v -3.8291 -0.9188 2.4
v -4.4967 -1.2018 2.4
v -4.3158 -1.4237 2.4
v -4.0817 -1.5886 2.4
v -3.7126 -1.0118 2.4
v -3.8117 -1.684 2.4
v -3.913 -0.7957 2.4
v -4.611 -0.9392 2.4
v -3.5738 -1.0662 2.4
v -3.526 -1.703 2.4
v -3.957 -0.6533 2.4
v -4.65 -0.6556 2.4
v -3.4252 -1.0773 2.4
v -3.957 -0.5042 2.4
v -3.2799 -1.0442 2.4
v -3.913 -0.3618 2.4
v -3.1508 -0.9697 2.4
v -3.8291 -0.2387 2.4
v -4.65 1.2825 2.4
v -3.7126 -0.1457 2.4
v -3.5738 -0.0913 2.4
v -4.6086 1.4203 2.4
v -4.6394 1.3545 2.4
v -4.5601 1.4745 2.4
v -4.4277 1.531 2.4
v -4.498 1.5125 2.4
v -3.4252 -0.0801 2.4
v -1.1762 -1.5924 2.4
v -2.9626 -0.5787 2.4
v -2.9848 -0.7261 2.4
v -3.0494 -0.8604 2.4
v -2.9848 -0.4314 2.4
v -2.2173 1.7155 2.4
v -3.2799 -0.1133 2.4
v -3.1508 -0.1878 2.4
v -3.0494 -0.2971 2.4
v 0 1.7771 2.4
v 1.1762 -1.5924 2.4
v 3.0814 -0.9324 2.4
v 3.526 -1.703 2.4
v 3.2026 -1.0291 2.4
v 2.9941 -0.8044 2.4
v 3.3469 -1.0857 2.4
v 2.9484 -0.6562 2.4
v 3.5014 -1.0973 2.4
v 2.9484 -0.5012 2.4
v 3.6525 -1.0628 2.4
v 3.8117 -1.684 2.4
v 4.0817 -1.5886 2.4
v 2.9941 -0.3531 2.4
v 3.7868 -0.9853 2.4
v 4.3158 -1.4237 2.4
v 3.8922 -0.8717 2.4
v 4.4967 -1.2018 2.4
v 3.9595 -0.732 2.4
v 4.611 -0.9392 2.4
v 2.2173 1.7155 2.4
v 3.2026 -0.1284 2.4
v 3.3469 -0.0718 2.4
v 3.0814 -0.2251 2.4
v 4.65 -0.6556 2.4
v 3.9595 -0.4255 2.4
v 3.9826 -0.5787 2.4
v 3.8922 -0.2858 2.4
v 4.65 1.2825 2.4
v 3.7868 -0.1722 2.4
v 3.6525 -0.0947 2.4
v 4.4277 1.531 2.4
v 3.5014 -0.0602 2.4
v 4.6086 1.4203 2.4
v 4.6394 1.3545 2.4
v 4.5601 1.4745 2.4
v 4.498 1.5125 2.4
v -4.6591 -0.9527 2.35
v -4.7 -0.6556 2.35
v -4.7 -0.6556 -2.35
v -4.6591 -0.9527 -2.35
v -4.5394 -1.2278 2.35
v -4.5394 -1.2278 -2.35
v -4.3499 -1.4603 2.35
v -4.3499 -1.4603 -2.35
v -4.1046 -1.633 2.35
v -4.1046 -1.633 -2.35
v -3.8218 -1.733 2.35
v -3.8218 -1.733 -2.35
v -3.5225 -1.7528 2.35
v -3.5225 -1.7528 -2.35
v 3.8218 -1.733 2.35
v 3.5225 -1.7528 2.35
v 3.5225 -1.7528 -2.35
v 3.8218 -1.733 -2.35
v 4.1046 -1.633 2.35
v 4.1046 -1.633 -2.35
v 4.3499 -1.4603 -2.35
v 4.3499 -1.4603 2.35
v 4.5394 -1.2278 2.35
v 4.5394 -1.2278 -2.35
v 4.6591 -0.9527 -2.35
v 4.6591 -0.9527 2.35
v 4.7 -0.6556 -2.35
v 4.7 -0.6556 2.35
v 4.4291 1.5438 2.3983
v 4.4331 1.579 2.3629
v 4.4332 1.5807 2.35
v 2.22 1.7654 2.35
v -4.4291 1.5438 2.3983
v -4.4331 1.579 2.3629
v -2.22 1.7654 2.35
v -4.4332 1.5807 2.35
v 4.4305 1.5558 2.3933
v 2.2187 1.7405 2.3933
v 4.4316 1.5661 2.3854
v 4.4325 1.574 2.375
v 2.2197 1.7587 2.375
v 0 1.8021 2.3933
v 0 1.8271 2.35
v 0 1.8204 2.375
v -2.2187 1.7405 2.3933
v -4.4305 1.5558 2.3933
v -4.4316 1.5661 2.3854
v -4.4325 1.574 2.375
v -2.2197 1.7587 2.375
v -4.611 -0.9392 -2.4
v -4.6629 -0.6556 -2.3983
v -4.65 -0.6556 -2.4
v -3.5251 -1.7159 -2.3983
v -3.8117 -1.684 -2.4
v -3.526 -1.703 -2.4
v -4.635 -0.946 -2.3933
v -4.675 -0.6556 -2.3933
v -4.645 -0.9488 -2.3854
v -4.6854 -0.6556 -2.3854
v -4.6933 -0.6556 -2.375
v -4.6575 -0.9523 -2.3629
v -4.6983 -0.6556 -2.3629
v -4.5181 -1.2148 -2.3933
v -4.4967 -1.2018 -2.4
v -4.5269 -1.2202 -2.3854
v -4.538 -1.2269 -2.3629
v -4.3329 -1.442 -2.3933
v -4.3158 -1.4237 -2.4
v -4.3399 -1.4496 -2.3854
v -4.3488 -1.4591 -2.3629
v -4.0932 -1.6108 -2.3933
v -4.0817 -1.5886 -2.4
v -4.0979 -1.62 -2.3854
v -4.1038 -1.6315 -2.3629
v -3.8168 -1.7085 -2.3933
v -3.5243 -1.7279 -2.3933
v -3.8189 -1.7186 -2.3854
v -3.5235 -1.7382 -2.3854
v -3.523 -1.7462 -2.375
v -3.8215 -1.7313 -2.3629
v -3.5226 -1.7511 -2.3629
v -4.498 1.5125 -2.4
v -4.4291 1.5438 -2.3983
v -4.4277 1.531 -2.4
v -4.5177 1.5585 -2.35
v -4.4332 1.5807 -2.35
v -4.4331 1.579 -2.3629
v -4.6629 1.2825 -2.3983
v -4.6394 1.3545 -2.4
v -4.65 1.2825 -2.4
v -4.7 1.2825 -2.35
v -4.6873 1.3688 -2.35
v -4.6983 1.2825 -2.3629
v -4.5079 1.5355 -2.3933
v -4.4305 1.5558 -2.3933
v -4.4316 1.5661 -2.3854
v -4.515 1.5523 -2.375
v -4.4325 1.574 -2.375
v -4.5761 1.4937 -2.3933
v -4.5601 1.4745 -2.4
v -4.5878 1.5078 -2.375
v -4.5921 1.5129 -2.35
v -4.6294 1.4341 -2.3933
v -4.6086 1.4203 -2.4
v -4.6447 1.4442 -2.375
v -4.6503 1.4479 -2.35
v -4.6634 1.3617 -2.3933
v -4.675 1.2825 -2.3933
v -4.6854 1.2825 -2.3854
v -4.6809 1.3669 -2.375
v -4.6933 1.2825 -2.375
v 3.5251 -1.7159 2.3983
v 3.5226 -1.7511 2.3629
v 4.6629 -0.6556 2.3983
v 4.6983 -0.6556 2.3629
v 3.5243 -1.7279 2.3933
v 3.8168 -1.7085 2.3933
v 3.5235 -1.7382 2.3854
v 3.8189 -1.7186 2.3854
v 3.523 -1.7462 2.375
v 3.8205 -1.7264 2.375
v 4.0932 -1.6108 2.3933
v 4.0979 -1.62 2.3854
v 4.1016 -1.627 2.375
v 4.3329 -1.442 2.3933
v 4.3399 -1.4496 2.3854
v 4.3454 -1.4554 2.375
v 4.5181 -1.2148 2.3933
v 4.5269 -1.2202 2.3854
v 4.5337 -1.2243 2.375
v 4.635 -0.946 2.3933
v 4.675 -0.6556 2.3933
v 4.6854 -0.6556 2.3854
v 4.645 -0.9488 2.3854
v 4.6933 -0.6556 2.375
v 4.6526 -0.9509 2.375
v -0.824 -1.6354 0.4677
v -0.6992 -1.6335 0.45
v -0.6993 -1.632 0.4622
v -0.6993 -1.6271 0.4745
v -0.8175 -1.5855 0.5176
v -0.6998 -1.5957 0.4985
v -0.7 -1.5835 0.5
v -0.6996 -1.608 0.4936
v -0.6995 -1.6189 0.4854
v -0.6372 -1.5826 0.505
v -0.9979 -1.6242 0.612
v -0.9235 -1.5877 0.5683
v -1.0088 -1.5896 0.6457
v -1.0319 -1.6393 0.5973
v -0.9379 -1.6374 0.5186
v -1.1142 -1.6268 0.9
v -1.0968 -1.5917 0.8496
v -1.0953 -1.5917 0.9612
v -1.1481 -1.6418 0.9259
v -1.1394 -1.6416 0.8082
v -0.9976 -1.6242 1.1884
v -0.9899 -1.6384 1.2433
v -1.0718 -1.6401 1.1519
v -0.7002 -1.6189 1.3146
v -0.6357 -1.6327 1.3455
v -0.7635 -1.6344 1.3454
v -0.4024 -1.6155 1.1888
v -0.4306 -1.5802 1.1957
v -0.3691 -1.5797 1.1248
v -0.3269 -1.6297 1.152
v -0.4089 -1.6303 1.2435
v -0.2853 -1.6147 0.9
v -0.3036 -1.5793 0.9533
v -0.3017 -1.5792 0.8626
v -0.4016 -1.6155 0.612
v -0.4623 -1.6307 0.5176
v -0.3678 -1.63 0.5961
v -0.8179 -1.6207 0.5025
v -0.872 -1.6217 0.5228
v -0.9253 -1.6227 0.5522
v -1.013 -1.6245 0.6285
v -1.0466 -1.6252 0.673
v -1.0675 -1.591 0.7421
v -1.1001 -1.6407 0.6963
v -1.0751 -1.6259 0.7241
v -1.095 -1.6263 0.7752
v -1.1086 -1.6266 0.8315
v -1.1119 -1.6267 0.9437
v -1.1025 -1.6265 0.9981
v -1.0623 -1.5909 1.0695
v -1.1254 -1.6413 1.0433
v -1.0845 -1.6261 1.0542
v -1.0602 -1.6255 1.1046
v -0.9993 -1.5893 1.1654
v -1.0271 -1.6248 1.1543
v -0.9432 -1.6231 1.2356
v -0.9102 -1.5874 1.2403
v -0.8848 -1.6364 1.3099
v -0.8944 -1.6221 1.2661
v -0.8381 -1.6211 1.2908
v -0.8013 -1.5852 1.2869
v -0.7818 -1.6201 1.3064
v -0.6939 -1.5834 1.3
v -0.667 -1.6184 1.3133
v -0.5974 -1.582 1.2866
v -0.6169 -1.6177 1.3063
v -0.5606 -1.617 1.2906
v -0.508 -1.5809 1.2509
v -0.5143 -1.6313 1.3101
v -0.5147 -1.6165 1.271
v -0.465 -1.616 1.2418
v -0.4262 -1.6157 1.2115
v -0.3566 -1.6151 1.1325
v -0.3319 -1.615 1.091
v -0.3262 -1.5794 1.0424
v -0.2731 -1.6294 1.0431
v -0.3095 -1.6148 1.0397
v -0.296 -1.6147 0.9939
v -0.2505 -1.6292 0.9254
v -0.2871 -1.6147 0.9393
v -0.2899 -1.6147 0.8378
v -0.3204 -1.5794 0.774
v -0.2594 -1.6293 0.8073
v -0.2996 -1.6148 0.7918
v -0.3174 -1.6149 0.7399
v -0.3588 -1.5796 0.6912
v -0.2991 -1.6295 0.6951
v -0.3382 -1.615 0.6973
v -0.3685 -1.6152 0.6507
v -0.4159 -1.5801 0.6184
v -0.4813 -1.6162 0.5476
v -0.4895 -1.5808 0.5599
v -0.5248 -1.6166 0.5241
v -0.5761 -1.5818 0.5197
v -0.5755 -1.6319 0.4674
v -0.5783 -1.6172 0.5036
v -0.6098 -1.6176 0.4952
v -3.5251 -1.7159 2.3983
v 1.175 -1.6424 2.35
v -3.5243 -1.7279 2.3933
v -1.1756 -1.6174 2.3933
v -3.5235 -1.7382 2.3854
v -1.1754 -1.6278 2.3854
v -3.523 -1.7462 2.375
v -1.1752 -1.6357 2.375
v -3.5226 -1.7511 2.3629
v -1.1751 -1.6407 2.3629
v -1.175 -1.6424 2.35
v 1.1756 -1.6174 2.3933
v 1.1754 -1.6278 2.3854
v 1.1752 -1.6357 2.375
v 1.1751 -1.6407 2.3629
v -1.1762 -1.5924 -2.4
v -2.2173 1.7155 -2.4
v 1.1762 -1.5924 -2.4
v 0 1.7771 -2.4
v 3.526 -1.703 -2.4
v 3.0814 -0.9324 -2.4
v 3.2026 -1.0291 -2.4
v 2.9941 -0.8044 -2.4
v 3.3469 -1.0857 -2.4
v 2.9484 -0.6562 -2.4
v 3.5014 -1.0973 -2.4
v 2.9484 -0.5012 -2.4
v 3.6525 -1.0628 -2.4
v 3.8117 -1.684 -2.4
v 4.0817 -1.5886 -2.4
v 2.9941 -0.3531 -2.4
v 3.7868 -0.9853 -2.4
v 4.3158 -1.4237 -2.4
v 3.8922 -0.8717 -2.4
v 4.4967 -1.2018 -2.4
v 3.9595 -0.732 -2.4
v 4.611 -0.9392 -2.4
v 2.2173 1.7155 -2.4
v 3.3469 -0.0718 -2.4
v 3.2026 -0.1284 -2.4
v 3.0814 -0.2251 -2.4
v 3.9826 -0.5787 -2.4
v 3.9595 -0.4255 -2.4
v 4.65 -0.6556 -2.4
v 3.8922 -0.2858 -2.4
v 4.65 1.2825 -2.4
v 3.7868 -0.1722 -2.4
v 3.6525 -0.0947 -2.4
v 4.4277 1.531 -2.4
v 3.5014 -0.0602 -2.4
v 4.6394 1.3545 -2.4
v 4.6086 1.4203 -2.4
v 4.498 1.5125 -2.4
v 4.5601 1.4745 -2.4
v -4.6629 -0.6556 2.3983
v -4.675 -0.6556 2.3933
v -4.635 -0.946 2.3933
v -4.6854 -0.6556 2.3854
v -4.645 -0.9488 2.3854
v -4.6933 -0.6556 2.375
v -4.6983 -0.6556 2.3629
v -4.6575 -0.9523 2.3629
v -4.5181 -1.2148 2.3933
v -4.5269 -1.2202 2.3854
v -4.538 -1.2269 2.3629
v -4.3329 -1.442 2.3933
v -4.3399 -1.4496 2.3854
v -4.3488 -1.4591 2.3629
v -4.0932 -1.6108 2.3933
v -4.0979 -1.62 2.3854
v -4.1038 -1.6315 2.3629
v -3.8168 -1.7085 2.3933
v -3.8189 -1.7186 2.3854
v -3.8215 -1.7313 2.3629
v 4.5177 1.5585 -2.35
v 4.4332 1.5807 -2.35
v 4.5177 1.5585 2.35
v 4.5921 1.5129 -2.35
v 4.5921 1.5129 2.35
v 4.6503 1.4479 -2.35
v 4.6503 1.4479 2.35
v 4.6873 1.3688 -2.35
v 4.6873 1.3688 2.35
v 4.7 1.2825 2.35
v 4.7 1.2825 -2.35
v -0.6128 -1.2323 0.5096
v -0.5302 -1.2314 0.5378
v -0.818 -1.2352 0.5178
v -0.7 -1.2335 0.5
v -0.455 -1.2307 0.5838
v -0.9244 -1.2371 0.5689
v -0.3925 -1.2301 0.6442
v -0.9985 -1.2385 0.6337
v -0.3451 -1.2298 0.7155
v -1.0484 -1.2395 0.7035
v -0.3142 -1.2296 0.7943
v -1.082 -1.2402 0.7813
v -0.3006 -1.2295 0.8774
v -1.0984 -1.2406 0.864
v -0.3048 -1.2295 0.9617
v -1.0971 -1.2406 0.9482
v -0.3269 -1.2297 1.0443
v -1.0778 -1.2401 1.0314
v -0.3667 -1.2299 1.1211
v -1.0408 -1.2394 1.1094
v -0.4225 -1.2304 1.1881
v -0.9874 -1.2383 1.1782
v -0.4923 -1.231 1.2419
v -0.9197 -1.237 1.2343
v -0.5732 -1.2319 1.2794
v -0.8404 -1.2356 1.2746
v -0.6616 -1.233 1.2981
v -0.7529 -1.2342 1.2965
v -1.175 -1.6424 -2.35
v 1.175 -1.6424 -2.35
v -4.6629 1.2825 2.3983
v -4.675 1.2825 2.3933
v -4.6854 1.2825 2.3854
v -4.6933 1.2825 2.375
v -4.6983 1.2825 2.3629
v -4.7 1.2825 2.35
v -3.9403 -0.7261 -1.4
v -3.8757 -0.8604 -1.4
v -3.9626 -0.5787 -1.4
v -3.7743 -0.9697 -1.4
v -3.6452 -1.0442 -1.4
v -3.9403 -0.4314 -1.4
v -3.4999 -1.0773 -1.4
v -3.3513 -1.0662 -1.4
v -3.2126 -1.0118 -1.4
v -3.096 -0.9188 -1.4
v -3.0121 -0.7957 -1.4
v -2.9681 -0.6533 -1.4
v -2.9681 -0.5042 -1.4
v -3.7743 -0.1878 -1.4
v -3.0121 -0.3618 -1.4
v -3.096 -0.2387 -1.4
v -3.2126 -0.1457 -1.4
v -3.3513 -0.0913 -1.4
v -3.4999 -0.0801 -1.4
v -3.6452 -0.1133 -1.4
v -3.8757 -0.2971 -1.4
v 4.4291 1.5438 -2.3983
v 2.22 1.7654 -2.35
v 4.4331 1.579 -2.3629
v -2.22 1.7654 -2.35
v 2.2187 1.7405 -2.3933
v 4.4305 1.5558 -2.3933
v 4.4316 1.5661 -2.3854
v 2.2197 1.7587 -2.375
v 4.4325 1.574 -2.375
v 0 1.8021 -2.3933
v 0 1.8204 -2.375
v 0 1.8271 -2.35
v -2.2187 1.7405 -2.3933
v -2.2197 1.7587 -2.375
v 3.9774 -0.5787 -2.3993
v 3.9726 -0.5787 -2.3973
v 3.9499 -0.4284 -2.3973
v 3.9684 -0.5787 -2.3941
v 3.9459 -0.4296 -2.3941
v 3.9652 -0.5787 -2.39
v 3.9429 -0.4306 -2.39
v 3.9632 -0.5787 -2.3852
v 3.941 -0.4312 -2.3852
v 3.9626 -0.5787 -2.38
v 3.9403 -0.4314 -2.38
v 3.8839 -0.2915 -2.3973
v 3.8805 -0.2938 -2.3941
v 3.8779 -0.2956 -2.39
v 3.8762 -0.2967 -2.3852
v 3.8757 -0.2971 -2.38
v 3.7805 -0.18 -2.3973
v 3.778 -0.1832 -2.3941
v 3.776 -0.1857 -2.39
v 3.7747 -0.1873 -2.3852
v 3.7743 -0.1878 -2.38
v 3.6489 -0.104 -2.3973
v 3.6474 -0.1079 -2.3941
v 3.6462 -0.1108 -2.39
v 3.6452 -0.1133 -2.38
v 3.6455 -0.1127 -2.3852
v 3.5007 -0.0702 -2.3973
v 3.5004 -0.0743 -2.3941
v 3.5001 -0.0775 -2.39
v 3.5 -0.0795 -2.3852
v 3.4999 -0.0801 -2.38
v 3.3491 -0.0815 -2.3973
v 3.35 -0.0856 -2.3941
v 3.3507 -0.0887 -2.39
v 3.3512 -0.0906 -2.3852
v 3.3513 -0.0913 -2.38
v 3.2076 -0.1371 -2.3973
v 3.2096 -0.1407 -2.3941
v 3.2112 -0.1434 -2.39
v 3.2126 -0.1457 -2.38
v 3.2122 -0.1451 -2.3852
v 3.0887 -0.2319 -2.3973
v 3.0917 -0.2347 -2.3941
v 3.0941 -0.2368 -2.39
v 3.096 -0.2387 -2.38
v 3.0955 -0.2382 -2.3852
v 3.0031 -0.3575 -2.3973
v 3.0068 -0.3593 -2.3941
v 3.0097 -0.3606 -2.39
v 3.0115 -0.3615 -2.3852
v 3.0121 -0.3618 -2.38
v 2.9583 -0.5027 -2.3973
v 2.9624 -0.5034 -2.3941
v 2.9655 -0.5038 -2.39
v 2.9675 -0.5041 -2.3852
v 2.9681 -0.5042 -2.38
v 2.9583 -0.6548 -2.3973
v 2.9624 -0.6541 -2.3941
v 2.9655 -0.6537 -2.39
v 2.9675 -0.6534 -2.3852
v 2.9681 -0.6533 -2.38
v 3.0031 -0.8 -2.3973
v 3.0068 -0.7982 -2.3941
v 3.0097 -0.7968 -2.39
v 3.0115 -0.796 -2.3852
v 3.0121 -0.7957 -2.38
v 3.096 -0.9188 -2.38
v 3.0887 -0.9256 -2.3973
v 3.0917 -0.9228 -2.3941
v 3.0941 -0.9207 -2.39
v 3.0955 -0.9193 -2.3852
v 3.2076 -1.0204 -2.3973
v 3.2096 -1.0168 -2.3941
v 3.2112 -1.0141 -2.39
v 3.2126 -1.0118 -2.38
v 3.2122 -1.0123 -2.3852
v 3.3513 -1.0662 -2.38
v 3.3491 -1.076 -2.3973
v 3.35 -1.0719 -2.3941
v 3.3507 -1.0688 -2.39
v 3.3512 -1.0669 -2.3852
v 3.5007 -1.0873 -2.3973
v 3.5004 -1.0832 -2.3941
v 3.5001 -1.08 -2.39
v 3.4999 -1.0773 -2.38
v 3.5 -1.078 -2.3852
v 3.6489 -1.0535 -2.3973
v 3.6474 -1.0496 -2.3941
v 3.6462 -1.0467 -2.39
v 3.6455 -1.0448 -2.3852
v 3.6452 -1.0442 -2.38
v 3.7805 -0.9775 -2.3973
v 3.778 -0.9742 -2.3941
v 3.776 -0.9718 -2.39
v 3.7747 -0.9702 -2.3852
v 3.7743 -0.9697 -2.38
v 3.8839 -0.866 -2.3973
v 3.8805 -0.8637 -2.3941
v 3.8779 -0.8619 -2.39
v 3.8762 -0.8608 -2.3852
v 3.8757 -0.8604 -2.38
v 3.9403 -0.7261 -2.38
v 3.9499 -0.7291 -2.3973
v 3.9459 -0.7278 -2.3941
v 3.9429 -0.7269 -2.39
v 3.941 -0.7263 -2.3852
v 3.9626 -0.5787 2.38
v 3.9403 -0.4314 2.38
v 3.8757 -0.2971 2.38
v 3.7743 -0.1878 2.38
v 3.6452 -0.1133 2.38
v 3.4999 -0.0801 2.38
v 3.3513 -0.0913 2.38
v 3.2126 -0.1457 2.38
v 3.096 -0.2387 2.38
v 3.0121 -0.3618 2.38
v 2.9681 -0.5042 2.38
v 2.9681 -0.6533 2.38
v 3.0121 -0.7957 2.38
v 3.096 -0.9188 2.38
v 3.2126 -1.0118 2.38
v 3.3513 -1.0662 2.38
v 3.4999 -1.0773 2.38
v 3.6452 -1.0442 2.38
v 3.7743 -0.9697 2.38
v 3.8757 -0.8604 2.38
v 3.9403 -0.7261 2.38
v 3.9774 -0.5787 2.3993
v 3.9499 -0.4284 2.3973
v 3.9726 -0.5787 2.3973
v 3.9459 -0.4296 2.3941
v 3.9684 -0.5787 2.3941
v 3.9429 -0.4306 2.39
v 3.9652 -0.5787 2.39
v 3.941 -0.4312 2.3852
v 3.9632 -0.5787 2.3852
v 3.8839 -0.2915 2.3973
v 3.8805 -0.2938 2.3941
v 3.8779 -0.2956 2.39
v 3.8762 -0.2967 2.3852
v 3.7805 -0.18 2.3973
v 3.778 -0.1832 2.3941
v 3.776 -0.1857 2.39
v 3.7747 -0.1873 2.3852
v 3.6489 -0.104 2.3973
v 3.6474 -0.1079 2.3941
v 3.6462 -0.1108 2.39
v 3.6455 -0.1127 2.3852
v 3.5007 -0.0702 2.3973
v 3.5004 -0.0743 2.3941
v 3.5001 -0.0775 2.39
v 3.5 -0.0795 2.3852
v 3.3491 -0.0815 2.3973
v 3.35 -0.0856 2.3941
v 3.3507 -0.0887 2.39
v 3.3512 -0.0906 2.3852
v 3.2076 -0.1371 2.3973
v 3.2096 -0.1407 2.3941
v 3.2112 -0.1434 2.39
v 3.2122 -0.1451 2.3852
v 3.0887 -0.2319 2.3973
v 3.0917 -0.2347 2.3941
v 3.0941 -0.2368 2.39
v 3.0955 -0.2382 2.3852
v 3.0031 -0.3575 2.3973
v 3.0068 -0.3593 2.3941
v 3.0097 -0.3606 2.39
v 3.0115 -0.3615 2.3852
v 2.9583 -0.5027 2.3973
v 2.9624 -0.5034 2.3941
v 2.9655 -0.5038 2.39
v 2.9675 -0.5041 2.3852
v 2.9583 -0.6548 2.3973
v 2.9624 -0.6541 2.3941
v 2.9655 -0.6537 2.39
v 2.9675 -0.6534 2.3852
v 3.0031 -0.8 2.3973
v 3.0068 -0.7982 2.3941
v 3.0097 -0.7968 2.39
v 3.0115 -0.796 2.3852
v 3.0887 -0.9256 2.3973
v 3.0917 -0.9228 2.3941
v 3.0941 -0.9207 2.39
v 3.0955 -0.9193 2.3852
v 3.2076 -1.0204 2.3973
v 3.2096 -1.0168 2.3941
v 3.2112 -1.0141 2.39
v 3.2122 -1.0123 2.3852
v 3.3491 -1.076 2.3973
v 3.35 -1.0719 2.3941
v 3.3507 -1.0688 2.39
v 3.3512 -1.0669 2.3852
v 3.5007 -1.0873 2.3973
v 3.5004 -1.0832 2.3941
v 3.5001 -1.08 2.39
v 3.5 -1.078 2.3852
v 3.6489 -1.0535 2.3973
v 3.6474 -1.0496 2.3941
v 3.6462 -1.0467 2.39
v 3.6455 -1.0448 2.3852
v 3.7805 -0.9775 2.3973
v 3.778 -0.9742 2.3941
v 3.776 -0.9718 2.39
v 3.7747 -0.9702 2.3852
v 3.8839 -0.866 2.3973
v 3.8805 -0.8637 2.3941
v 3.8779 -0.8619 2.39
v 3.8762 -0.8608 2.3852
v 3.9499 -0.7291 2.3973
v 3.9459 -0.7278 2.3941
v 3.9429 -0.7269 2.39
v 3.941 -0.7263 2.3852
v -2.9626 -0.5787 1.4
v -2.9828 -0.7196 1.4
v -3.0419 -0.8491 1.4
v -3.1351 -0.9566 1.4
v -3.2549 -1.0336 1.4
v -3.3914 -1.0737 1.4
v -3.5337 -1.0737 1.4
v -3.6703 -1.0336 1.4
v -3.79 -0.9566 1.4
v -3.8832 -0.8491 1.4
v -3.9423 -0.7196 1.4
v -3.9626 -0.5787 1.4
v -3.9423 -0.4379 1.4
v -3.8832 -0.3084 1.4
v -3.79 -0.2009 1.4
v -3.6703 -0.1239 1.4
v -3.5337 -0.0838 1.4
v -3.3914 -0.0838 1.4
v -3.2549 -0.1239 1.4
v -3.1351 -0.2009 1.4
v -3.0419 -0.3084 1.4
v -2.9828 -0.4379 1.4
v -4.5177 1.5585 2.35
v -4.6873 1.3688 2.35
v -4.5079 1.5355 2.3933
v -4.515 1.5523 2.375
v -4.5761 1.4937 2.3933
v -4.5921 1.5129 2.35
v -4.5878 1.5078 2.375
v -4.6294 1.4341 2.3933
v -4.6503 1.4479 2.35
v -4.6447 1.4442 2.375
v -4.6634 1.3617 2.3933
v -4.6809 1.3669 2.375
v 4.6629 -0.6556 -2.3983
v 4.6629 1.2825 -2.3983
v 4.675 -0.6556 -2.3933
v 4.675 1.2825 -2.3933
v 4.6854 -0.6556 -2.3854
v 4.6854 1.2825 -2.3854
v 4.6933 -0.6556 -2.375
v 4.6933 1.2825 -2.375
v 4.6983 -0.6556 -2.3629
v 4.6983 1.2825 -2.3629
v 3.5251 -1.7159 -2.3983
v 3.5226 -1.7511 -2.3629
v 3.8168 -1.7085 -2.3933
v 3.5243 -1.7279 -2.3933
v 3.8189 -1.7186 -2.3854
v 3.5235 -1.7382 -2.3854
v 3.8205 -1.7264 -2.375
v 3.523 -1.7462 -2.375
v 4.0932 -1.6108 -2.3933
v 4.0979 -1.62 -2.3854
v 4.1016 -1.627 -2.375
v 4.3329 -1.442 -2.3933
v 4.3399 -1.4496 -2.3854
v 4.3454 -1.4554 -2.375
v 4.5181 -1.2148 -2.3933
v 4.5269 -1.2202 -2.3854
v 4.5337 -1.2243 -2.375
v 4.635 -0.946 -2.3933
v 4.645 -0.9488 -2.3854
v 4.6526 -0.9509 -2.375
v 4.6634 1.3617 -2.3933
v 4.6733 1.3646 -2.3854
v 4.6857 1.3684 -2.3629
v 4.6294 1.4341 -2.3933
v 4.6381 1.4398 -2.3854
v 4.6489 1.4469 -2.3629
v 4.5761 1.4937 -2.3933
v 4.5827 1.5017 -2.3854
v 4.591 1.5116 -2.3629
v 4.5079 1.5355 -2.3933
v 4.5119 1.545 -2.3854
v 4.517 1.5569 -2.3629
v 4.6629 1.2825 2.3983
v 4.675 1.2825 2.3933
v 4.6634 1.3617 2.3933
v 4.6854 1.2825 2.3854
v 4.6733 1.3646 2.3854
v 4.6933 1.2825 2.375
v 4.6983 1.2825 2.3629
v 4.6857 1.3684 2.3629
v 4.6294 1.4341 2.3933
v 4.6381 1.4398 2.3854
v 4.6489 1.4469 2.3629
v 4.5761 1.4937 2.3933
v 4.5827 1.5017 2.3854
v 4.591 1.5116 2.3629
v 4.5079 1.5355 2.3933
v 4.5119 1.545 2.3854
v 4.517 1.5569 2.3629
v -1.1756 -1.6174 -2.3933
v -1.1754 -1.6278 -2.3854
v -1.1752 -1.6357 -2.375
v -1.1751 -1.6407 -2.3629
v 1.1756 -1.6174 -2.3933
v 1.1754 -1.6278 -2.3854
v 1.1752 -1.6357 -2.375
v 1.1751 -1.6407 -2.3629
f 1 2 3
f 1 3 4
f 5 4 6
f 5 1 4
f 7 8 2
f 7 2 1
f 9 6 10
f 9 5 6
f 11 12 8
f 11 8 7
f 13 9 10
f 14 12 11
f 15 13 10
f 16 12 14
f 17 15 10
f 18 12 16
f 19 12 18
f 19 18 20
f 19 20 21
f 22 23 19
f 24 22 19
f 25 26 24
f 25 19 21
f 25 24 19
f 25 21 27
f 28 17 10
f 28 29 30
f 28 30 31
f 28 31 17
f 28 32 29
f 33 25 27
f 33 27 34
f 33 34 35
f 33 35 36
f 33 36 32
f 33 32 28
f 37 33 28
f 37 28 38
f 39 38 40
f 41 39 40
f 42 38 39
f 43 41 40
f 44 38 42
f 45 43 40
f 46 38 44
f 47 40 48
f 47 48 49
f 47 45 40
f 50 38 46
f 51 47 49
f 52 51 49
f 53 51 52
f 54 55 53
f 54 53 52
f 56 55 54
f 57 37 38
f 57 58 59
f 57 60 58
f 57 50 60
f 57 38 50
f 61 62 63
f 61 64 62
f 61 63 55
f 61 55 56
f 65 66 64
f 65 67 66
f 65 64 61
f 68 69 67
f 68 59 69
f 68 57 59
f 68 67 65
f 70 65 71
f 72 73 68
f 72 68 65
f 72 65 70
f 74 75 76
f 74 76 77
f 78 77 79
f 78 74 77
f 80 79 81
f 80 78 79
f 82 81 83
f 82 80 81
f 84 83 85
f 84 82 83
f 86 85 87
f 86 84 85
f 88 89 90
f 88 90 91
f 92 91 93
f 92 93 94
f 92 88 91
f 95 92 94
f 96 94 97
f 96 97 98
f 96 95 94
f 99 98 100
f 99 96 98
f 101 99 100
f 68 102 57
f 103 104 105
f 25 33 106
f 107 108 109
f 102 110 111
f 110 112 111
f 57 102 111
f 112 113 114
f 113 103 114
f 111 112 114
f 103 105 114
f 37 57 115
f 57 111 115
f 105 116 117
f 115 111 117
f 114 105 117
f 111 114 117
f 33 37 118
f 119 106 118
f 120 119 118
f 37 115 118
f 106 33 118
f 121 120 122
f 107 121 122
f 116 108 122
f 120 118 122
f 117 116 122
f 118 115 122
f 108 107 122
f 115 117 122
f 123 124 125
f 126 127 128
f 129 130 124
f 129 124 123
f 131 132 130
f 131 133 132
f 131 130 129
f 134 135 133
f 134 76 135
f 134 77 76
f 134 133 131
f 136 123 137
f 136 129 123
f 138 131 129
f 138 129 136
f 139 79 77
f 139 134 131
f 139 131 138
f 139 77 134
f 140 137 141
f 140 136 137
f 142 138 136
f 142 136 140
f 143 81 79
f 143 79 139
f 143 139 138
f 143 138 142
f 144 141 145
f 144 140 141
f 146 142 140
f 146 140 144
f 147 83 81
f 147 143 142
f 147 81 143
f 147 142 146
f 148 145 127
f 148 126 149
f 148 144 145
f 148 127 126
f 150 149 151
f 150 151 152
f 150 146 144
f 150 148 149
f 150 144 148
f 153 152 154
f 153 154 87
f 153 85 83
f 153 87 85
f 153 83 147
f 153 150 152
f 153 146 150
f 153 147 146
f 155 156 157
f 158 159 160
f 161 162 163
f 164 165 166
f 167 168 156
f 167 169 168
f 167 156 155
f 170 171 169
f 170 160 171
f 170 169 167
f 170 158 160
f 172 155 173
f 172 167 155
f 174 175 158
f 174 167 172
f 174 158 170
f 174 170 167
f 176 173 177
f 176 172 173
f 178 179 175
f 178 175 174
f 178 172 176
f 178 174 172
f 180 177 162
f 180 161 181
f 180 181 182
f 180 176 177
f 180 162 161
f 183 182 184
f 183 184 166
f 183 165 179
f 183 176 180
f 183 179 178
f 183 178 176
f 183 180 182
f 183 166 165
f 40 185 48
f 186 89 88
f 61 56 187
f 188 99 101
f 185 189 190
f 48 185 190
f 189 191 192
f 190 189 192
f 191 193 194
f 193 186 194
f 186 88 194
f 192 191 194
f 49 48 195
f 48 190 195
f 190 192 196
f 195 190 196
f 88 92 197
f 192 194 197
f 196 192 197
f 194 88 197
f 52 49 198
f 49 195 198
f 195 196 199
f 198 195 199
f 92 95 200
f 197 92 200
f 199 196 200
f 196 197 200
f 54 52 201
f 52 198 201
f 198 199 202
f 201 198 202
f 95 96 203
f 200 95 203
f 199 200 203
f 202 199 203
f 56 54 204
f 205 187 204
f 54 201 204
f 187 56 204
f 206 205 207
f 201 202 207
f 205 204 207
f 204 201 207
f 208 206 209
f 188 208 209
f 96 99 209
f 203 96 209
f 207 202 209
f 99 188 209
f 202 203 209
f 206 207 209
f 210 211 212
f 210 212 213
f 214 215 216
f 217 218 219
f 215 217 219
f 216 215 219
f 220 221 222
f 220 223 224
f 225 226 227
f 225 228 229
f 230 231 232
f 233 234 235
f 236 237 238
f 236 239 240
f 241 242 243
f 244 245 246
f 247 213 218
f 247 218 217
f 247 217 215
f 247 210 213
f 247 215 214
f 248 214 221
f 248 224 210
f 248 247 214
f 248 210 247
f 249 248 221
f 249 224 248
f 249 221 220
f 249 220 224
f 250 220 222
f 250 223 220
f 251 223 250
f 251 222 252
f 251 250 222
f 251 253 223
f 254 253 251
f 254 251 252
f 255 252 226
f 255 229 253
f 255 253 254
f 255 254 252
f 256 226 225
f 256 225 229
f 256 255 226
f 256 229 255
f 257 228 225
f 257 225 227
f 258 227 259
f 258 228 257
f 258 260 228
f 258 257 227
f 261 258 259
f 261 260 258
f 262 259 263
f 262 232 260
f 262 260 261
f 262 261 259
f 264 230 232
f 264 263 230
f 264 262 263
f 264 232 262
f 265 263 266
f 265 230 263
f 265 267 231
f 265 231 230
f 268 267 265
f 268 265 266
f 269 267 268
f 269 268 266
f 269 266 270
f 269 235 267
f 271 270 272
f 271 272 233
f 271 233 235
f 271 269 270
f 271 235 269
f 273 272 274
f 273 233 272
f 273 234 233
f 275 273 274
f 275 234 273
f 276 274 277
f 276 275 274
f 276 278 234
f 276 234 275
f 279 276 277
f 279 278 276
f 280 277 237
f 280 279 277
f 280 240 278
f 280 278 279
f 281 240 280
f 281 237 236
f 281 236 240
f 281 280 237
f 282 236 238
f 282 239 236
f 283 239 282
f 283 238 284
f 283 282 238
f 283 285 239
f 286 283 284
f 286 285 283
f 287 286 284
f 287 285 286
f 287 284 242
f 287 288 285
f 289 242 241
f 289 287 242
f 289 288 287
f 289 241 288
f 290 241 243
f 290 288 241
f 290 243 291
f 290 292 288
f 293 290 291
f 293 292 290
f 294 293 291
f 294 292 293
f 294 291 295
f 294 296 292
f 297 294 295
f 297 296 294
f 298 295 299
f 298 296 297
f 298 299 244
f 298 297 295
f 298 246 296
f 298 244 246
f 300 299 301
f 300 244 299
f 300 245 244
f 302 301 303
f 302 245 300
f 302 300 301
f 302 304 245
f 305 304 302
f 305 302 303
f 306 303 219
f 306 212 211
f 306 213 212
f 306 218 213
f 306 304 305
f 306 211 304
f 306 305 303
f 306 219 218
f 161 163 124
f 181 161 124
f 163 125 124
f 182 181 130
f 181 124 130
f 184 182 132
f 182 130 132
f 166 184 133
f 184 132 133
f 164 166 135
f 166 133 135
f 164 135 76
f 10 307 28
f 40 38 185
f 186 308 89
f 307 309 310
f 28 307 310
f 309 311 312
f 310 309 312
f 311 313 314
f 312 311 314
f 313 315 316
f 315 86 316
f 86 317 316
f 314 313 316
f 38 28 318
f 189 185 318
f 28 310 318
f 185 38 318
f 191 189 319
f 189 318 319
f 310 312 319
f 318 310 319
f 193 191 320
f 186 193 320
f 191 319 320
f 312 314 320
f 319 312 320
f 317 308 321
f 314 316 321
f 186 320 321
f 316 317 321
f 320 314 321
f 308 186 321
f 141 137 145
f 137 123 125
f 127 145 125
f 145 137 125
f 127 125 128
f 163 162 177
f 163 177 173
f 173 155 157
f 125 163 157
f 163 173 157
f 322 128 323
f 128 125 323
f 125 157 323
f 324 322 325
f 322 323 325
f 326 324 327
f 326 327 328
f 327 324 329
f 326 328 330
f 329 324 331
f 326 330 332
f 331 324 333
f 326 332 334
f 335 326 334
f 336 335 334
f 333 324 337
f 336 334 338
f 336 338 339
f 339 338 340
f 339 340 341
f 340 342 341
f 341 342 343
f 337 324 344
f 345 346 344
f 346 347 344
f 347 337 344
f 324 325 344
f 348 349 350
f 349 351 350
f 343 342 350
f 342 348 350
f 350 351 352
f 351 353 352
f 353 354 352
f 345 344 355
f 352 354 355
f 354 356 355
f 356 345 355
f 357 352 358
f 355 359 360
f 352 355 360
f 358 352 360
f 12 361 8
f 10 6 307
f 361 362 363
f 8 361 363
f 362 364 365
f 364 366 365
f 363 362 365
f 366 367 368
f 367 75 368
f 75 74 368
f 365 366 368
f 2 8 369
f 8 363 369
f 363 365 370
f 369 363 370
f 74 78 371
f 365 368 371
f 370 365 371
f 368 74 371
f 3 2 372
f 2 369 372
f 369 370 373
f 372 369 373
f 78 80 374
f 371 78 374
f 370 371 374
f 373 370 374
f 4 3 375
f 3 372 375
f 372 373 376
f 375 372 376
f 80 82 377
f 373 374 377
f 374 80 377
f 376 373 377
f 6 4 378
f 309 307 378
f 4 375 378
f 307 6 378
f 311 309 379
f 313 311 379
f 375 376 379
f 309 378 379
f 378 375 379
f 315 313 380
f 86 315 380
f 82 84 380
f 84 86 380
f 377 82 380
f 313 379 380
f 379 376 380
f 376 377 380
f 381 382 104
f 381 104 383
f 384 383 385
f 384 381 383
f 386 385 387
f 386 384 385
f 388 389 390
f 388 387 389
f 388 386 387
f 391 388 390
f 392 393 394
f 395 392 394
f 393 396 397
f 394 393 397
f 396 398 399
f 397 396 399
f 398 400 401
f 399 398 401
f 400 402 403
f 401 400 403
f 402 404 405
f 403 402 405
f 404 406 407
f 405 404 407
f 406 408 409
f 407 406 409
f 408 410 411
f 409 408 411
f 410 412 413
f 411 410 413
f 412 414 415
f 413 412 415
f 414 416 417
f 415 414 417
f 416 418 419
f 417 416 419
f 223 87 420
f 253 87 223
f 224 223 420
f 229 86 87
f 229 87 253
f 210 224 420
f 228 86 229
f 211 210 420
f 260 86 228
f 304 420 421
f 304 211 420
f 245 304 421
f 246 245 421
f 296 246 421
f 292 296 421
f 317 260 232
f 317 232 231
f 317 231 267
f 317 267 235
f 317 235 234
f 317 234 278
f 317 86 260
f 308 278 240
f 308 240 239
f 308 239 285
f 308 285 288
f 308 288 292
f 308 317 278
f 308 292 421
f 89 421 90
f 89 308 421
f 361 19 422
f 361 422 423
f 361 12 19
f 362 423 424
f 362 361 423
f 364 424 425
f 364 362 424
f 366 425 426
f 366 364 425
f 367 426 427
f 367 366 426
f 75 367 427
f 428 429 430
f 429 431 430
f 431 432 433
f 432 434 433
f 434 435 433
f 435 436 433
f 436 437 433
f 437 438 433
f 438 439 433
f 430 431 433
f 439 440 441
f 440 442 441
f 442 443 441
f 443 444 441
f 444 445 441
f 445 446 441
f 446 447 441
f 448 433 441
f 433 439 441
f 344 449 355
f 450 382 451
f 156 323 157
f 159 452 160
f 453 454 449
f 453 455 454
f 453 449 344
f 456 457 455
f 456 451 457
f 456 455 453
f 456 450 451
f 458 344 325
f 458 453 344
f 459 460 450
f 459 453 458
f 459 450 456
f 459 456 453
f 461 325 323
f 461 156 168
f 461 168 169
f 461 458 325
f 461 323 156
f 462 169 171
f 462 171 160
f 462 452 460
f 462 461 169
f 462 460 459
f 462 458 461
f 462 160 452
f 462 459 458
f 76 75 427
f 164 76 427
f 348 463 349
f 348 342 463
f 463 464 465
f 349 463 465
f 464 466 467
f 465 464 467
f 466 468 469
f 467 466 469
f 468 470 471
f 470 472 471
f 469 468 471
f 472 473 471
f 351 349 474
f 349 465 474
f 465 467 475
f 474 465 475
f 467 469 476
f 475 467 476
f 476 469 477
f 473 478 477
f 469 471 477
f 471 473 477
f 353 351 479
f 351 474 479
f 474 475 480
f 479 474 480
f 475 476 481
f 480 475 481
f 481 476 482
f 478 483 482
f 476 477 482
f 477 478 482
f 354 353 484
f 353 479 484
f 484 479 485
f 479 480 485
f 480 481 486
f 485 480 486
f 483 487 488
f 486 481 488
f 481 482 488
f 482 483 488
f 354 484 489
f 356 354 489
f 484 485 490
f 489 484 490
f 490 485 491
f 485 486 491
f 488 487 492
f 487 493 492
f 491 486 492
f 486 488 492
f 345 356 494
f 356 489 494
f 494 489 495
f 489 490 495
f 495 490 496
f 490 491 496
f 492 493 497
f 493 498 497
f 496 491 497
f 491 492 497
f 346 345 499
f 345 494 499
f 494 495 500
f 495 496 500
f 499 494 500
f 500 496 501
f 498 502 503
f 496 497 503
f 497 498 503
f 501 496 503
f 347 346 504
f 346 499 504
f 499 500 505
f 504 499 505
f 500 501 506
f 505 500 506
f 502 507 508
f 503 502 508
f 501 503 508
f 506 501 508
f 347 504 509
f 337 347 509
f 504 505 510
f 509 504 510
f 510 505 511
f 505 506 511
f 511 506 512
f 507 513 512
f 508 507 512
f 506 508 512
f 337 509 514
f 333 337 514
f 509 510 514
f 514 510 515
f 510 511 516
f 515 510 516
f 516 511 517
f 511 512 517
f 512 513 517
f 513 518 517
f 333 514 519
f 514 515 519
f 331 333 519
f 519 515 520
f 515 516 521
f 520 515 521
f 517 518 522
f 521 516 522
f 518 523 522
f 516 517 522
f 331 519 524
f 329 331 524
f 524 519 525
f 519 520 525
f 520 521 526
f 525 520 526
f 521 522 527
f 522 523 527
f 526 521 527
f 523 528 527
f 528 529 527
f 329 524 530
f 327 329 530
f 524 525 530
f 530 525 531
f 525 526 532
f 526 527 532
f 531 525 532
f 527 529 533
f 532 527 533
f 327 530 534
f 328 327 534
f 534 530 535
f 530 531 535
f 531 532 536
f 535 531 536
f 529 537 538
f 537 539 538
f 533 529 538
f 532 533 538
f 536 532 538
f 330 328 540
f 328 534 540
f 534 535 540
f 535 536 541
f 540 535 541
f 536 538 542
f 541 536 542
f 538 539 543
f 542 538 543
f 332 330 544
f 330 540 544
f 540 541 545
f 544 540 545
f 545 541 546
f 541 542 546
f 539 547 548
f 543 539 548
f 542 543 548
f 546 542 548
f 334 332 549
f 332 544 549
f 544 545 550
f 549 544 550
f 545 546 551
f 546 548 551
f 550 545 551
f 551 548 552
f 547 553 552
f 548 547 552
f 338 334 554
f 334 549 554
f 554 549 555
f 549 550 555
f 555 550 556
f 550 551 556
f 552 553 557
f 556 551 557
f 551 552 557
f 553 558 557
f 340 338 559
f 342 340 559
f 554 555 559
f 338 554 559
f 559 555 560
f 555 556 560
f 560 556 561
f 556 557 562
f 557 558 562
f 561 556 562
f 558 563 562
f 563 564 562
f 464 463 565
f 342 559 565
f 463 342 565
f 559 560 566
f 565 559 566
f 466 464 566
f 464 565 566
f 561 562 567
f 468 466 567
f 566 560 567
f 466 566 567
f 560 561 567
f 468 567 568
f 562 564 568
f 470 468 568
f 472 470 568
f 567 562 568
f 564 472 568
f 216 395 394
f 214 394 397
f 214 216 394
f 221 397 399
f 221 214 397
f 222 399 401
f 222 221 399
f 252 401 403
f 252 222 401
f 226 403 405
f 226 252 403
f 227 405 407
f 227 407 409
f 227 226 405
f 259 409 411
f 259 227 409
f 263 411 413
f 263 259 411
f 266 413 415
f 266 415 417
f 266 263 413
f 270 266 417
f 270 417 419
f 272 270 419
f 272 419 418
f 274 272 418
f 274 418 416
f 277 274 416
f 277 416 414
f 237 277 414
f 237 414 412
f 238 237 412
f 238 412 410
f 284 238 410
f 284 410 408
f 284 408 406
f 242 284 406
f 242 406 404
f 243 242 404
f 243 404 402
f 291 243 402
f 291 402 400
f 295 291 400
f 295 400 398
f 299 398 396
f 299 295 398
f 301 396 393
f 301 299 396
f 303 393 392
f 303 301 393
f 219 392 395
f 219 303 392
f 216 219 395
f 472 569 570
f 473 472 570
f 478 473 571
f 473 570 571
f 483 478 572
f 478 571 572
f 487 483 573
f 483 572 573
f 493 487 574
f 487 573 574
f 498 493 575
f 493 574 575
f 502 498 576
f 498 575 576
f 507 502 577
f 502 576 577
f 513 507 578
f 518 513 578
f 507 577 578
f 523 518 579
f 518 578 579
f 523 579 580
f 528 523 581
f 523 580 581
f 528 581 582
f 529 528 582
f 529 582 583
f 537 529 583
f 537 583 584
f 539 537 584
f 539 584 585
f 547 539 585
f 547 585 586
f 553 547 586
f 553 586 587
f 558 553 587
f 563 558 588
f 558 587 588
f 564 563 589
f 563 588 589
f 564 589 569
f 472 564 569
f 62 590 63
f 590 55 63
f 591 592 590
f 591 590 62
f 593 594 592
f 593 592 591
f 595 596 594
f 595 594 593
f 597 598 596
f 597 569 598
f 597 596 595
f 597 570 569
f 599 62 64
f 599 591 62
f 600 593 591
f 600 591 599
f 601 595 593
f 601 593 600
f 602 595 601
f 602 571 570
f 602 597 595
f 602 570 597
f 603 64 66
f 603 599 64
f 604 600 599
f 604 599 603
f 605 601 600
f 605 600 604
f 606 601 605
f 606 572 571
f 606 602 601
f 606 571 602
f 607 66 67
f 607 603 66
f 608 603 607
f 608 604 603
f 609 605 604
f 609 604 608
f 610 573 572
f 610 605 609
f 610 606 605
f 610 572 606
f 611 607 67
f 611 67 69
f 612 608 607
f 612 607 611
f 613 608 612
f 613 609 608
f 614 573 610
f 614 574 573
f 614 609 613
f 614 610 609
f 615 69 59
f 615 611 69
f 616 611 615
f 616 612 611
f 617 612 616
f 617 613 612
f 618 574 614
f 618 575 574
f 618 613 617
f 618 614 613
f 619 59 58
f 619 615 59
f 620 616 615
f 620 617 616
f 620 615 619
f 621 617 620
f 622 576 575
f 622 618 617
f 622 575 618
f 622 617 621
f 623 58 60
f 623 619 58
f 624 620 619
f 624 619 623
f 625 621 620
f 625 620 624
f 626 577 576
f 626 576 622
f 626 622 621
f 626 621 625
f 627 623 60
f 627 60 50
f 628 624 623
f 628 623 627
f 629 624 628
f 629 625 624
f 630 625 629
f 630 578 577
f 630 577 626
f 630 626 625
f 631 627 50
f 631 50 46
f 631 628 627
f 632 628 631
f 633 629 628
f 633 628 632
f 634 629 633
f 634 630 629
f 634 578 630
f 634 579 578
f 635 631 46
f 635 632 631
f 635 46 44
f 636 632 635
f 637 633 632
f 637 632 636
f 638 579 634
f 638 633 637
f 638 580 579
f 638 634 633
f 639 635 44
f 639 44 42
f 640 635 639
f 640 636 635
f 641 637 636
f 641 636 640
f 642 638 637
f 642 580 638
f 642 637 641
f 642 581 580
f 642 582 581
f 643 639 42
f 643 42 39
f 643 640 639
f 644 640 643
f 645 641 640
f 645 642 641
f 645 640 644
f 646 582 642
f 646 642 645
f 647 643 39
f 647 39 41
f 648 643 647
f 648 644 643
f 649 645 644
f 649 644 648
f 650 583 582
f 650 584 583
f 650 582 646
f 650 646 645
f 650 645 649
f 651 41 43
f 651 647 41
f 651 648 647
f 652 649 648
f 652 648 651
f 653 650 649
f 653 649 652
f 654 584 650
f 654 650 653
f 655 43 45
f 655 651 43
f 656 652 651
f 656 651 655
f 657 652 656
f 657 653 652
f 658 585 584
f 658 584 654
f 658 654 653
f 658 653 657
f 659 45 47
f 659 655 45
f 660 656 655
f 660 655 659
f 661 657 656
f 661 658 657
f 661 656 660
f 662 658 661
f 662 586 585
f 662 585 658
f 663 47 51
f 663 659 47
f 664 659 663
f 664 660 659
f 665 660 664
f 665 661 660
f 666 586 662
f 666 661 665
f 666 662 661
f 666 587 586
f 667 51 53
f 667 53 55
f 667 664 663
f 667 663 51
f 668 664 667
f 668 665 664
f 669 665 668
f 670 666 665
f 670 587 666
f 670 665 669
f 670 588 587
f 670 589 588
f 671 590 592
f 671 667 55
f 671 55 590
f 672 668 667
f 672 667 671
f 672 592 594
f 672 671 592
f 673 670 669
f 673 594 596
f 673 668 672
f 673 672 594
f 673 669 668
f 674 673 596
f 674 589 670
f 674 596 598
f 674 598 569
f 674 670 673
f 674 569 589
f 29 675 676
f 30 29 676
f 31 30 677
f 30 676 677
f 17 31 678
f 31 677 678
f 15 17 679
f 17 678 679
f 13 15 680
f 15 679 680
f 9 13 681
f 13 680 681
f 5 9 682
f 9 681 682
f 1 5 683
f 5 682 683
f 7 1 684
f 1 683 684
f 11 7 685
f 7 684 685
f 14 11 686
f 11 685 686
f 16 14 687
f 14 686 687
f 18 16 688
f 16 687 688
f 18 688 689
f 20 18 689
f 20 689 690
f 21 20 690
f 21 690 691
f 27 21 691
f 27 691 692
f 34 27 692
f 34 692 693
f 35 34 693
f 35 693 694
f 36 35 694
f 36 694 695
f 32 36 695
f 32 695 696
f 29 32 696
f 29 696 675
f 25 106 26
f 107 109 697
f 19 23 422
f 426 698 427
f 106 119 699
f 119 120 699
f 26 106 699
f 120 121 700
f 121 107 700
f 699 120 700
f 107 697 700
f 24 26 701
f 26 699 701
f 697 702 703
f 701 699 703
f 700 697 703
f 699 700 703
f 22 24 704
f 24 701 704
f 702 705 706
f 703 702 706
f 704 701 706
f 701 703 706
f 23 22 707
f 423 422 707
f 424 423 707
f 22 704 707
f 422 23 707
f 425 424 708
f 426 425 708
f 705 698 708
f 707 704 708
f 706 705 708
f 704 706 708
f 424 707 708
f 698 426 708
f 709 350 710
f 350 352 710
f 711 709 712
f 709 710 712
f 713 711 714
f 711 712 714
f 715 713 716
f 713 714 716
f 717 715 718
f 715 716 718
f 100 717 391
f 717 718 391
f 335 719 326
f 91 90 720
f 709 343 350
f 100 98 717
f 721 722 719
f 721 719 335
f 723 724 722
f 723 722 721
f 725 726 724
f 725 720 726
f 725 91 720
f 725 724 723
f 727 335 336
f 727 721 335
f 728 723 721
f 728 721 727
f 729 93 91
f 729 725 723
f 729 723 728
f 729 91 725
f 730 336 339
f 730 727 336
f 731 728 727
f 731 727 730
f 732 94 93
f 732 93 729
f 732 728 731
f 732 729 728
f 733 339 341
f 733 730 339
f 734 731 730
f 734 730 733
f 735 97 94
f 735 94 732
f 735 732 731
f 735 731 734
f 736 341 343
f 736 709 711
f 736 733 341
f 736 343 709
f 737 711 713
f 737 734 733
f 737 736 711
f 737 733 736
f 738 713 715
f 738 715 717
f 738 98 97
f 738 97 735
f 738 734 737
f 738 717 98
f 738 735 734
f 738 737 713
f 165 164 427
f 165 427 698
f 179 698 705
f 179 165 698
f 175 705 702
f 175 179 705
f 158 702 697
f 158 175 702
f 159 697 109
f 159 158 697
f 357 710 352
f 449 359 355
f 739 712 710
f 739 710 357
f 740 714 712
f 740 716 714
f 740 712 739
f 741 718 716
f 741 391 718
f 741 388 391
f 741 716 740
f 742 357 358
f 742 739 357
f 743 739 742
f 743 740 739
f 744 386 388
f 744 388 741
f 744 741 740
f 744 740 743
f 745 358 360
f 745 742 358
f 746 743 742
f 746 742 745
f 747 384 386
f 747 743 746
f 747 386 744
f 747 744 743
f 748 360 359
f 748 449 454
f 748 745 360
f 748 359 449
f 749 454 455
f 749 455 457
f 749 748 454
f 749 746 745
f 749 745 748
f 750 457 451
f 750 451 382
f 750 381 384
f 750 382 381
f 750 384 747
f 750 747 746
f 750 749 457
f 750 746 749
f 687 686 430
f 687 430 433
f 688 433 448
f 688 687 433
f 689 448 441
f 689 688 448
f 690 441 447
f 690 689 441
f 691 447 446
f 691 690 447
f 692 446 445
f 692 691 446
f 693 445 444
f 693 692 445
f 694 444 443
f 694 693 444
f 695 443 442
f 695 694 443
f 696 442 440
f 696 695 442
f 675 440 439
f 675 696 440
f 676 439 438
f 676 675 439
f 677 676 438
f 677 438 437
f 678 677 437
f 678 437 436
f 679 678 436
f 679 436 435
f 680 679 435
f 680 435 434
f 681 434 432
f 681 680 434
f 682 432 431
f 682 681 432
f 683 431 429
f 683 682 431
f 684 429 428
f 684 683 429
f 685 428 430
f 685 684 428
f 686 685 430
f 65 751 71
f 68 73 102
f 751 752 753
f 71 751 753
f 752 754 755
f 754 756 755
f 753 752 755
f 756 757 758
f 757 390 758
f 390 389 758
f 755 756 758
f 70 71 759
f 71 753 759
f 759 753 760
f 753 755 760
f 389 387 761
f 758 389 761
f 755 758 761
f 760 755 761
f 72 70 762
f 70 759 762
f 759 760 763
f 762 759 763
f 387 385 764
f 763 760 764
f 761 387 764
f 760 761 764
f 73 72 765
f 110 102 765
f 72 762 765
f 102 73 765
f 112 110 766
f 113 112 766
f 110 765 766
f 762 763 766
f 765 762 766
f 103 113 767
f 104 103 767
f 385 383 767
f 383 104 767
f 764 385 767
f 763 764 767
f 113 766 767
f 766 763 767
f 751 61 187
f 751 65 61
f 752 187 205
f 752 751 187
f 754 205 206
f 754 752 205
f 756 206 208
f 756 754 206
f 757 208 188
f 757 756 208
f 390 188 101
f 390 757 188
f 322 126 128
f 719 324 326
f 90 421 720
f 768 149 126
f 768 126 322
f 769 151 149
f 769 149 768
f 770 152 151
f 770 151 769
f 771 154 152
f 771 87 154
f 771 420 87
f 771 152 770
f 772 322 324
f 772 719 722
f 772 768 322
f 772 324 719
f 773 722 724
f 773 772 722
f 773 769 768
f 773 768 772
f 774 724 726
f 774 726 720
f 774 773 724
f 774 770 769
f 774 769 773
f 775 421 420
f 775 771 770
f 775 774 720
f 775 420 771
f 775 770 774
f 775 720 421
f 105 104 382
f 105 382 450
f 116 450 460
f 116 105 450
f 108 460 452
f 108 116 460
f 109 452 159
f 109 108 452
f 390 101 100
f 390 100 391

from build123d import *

# Parameters (mm, degrees)
SKETCH1_W               = 9.4
SKETCH1_H               = 3.7
BOSS_EXTRUDE1_DEPTH     = 2.4
CUT_EXTRUDE1_DEPTH      = 4.8
FILLET1_R               = 1.1
FILLET2_R               = 0.3
FILLET3_R               = 0.05
SKETCH3_R               = 0.5
CUT_EXTRUDE2_DEPTH      = 4.8
FILLET4_R               = 0.02
SKETCH4_W               = 1.881576533
SKETCH4_H               = 1.177564348
BOSS_EXTRUDE2_DEPTH     = 1
SKETCH5_R               = 0.5
CUT_EXTRUDE3_DEPTH      = 10
SKETCH6_R               = 0.737542503
BOSS_EXTRUDE3_DEPTH     = 1
CUT_EXTRUDE4_REACH      = 17.585
CUT_EXTRUDE4_END_RADIUS = 50.4
CUT_EXTRUDE4_START      = -10
SKETCH7_R               = 0.4
FILLET5_R               = 0.05


with BuildPart() as part:
    # Sketch1 → Boss-Extrude1 (new, symmetric)
    with BuildSketch(Plane.XY):
        Rectangle(SKETCH1_W, SKETCH1_H)
    extrude(amount=BOSS_EXTRUDE1_DEPTH, both=True)

    # Sketch2 → Cut-Extrude1 (cut)
    with BuildSketch(Plane.XY.offset(2.4)):
        with BuildLine():
            Line((-4.7, 1.55), (-7.120690005, 4.011417256))
            Line((-7.120690005, 4.011417256), (5.535860742, 3.886722174))
            Line((5.535860742, 3.886722174), (4.7, 1.55))
            ThreePointArc((4.7, 1.55), (0, 1.827084699), (-4.7, 1.55))
        make_face()
        with BuildLine():
            Line((4.7, -1.85), (0.350623614, -3.782025322))
            Line((0.350623614, -3.782025322), (-4.7, -1.85))
            ThreePointArc((-4.7, -1.85), (0, -1.628609864), (4.7, -1.85))
        make_face()
    extrude(amount=-CUT_EXTRUDE1_DEPTH, mode=Mode.SUBTRACT)

    # Fillet1
    fillet1_edges = [part.edges().sort_by_distance(p)[0] for p in [
        (4.7, -1.85, 0),
        (-4.7, -1.85, 0),
    ]]
    fillet(fillet1_edges, radius=FILLET1_R)

    # Fillet2
    fillet2_edges = [part.edges().sort_by_distance(p)[0] for p in [
        (4.7, 1.55, 0),
        (-4.7, 1.55, 0),
    ]]
    fillet(fillet2_edges, radius=FILLET2_R)

    # Fillet3
    fillet3_edges = [part.edges().sort_by_distance(p)[0] for p in [
        (4.7, 0.3134624, -2.4),
        (4.7, 0.3134624, 2.4),
        (0, -1.628609864, -2.4),
        (-4.349918456, -1.460327621, -2.4),
        (4.349918456, -1.460327621, -2.4),
        (0, -1.628609864, 2.4),
        (-4.349918456, -1.460327621, 2.4),
        (4.349918456, -1.460327621, 2.4),
        (0, 1.827084699, 2.4),
        (-4.7, 0.3134624, 2.4),
        (-4.623578634, 1.482534062, 2.4),
        (4.623578634, 1.482534062, 2.4),
        (0, 1.827084699, -2.4),
        (-4.7, 0.3134624, -2.4),
        (-4.623578634, 1.482534062, -2.4),
        (4.623578634, 1.482534062, -2.4),
    ]]
    fillet(fillet3_edges, radius=FILLET3_R)

    # Sketch3 → Cut-Extrude2 (cut)
    with BuildSketch(Plane.XY.offset(2.4)):
        with Locations((3.462563269, -0.578744651)):
            Circle(SKETCH3_R)
    cut_extrude2 = extrude(amount=-CUT_EXTRUDE2_DEPTH, mode=Mode.SUBTRACT)

    # Fillet4
    fillet4_edges = [part.edges().sort_by_distance(p)[0] for p in [
        (2.962563269, -0.578744651, -2.4),
        (2.962563269, -0.578744651, 2.4),
    ]]
    fillet(fillet4_edges, radius=FILLET4_R)

    # Mirror1: Cut-Extrude2 across plane
    add(cut_extrude2.mirror(Plane(origin=(0, 0, 0), x_dir=(0, 0, 1), z_dir=(1, 0, 0))), mode=Mode.SUBTRACT)

    # Sketch4 → Boss-Extrude2 (add)
    with BuildSketch(Plane.XY.offset(2.4)):
        with Locations((-3.353123346, -0.588782174)):
            Rectangle(SKETCH4_W, SKETCH4_H)
    extrude(amount=-BOSS_EXTRUDE2_DEPTH)

    # Sketch5 → Cut-Extrude3 (cut)
    with BuildSketch(Plane(origin=(0, 0, 1.4), x_dir=(-1, 0, 0), z_dir=(0, 0, -1))):
        with Locations(Location((3.462563269, -0.578744651, 0), (0, 0, 180))):
            Circle(SKETCH5_R)
    extrude(amount=-CUT_EXTRUDE3_DEPTH, mode=Mode.SUBTRACT)

    # Sketch6 → Boss-Extrude3 (add)
    with BuildSketch(Plane(origin=(0, 0, -2.4), x_dir=(-1, 0, 0), z_dir=(0, 0, -1))):
        with Locations((3.526657277, -0.607938651)):
            Circle(SKETCH6_R)
    extrude(amount=-BOSS_EXTRUDE3_DEPTH)

    # Cut-Extrude4: up to this cylinder (the profile starts inside it)
    cut_extrude4_end = Plane(origin=(0, -51.628609864, 0.9), z_dir=(0, 0, 1)) * Cylinder(CUT_EXTRUDE4_END_RADIUS, 136.97, mode=Mode.PRIVATE)
    # Sketch7 → Cut-Extrude4 (cut, up to the surface)
    with BuildSketch(Plane(origin=(0, 0, 0), x_dir=(1, 0, 0), z_dir=(0, 1, 0)).offset(CUT_EXTRUDE4_START), mode=Mode.PRIVATE) as cut_extrude4_sk1:
        with Locations(Location((-0.7, -0.9, 0), (0, 0, 90))):
            Circle(SKETCH7_R)
    cut_extrude4_tool1 = extrude(cut_extrude4_sk1.sketch, amount=CUT_EXTRUDE4_REACH, mode=Mode.PRIVATE) & cut_extrude4_end
    add(cut_extrude4_tool1.solids().sort_by_distance((-0.7, -10, 0.9))[0], mode=Mode.SUBTRACT)

    # Fillet5
    fillet5_edges = [part.edges().sort_by_distance(p)[0] for p in [
        (-0.700029875, -1.633510522, 1.299999999),
    ]]
    fillet(fillet5_edges, radius=FILLET5_R)


solid = part.part
